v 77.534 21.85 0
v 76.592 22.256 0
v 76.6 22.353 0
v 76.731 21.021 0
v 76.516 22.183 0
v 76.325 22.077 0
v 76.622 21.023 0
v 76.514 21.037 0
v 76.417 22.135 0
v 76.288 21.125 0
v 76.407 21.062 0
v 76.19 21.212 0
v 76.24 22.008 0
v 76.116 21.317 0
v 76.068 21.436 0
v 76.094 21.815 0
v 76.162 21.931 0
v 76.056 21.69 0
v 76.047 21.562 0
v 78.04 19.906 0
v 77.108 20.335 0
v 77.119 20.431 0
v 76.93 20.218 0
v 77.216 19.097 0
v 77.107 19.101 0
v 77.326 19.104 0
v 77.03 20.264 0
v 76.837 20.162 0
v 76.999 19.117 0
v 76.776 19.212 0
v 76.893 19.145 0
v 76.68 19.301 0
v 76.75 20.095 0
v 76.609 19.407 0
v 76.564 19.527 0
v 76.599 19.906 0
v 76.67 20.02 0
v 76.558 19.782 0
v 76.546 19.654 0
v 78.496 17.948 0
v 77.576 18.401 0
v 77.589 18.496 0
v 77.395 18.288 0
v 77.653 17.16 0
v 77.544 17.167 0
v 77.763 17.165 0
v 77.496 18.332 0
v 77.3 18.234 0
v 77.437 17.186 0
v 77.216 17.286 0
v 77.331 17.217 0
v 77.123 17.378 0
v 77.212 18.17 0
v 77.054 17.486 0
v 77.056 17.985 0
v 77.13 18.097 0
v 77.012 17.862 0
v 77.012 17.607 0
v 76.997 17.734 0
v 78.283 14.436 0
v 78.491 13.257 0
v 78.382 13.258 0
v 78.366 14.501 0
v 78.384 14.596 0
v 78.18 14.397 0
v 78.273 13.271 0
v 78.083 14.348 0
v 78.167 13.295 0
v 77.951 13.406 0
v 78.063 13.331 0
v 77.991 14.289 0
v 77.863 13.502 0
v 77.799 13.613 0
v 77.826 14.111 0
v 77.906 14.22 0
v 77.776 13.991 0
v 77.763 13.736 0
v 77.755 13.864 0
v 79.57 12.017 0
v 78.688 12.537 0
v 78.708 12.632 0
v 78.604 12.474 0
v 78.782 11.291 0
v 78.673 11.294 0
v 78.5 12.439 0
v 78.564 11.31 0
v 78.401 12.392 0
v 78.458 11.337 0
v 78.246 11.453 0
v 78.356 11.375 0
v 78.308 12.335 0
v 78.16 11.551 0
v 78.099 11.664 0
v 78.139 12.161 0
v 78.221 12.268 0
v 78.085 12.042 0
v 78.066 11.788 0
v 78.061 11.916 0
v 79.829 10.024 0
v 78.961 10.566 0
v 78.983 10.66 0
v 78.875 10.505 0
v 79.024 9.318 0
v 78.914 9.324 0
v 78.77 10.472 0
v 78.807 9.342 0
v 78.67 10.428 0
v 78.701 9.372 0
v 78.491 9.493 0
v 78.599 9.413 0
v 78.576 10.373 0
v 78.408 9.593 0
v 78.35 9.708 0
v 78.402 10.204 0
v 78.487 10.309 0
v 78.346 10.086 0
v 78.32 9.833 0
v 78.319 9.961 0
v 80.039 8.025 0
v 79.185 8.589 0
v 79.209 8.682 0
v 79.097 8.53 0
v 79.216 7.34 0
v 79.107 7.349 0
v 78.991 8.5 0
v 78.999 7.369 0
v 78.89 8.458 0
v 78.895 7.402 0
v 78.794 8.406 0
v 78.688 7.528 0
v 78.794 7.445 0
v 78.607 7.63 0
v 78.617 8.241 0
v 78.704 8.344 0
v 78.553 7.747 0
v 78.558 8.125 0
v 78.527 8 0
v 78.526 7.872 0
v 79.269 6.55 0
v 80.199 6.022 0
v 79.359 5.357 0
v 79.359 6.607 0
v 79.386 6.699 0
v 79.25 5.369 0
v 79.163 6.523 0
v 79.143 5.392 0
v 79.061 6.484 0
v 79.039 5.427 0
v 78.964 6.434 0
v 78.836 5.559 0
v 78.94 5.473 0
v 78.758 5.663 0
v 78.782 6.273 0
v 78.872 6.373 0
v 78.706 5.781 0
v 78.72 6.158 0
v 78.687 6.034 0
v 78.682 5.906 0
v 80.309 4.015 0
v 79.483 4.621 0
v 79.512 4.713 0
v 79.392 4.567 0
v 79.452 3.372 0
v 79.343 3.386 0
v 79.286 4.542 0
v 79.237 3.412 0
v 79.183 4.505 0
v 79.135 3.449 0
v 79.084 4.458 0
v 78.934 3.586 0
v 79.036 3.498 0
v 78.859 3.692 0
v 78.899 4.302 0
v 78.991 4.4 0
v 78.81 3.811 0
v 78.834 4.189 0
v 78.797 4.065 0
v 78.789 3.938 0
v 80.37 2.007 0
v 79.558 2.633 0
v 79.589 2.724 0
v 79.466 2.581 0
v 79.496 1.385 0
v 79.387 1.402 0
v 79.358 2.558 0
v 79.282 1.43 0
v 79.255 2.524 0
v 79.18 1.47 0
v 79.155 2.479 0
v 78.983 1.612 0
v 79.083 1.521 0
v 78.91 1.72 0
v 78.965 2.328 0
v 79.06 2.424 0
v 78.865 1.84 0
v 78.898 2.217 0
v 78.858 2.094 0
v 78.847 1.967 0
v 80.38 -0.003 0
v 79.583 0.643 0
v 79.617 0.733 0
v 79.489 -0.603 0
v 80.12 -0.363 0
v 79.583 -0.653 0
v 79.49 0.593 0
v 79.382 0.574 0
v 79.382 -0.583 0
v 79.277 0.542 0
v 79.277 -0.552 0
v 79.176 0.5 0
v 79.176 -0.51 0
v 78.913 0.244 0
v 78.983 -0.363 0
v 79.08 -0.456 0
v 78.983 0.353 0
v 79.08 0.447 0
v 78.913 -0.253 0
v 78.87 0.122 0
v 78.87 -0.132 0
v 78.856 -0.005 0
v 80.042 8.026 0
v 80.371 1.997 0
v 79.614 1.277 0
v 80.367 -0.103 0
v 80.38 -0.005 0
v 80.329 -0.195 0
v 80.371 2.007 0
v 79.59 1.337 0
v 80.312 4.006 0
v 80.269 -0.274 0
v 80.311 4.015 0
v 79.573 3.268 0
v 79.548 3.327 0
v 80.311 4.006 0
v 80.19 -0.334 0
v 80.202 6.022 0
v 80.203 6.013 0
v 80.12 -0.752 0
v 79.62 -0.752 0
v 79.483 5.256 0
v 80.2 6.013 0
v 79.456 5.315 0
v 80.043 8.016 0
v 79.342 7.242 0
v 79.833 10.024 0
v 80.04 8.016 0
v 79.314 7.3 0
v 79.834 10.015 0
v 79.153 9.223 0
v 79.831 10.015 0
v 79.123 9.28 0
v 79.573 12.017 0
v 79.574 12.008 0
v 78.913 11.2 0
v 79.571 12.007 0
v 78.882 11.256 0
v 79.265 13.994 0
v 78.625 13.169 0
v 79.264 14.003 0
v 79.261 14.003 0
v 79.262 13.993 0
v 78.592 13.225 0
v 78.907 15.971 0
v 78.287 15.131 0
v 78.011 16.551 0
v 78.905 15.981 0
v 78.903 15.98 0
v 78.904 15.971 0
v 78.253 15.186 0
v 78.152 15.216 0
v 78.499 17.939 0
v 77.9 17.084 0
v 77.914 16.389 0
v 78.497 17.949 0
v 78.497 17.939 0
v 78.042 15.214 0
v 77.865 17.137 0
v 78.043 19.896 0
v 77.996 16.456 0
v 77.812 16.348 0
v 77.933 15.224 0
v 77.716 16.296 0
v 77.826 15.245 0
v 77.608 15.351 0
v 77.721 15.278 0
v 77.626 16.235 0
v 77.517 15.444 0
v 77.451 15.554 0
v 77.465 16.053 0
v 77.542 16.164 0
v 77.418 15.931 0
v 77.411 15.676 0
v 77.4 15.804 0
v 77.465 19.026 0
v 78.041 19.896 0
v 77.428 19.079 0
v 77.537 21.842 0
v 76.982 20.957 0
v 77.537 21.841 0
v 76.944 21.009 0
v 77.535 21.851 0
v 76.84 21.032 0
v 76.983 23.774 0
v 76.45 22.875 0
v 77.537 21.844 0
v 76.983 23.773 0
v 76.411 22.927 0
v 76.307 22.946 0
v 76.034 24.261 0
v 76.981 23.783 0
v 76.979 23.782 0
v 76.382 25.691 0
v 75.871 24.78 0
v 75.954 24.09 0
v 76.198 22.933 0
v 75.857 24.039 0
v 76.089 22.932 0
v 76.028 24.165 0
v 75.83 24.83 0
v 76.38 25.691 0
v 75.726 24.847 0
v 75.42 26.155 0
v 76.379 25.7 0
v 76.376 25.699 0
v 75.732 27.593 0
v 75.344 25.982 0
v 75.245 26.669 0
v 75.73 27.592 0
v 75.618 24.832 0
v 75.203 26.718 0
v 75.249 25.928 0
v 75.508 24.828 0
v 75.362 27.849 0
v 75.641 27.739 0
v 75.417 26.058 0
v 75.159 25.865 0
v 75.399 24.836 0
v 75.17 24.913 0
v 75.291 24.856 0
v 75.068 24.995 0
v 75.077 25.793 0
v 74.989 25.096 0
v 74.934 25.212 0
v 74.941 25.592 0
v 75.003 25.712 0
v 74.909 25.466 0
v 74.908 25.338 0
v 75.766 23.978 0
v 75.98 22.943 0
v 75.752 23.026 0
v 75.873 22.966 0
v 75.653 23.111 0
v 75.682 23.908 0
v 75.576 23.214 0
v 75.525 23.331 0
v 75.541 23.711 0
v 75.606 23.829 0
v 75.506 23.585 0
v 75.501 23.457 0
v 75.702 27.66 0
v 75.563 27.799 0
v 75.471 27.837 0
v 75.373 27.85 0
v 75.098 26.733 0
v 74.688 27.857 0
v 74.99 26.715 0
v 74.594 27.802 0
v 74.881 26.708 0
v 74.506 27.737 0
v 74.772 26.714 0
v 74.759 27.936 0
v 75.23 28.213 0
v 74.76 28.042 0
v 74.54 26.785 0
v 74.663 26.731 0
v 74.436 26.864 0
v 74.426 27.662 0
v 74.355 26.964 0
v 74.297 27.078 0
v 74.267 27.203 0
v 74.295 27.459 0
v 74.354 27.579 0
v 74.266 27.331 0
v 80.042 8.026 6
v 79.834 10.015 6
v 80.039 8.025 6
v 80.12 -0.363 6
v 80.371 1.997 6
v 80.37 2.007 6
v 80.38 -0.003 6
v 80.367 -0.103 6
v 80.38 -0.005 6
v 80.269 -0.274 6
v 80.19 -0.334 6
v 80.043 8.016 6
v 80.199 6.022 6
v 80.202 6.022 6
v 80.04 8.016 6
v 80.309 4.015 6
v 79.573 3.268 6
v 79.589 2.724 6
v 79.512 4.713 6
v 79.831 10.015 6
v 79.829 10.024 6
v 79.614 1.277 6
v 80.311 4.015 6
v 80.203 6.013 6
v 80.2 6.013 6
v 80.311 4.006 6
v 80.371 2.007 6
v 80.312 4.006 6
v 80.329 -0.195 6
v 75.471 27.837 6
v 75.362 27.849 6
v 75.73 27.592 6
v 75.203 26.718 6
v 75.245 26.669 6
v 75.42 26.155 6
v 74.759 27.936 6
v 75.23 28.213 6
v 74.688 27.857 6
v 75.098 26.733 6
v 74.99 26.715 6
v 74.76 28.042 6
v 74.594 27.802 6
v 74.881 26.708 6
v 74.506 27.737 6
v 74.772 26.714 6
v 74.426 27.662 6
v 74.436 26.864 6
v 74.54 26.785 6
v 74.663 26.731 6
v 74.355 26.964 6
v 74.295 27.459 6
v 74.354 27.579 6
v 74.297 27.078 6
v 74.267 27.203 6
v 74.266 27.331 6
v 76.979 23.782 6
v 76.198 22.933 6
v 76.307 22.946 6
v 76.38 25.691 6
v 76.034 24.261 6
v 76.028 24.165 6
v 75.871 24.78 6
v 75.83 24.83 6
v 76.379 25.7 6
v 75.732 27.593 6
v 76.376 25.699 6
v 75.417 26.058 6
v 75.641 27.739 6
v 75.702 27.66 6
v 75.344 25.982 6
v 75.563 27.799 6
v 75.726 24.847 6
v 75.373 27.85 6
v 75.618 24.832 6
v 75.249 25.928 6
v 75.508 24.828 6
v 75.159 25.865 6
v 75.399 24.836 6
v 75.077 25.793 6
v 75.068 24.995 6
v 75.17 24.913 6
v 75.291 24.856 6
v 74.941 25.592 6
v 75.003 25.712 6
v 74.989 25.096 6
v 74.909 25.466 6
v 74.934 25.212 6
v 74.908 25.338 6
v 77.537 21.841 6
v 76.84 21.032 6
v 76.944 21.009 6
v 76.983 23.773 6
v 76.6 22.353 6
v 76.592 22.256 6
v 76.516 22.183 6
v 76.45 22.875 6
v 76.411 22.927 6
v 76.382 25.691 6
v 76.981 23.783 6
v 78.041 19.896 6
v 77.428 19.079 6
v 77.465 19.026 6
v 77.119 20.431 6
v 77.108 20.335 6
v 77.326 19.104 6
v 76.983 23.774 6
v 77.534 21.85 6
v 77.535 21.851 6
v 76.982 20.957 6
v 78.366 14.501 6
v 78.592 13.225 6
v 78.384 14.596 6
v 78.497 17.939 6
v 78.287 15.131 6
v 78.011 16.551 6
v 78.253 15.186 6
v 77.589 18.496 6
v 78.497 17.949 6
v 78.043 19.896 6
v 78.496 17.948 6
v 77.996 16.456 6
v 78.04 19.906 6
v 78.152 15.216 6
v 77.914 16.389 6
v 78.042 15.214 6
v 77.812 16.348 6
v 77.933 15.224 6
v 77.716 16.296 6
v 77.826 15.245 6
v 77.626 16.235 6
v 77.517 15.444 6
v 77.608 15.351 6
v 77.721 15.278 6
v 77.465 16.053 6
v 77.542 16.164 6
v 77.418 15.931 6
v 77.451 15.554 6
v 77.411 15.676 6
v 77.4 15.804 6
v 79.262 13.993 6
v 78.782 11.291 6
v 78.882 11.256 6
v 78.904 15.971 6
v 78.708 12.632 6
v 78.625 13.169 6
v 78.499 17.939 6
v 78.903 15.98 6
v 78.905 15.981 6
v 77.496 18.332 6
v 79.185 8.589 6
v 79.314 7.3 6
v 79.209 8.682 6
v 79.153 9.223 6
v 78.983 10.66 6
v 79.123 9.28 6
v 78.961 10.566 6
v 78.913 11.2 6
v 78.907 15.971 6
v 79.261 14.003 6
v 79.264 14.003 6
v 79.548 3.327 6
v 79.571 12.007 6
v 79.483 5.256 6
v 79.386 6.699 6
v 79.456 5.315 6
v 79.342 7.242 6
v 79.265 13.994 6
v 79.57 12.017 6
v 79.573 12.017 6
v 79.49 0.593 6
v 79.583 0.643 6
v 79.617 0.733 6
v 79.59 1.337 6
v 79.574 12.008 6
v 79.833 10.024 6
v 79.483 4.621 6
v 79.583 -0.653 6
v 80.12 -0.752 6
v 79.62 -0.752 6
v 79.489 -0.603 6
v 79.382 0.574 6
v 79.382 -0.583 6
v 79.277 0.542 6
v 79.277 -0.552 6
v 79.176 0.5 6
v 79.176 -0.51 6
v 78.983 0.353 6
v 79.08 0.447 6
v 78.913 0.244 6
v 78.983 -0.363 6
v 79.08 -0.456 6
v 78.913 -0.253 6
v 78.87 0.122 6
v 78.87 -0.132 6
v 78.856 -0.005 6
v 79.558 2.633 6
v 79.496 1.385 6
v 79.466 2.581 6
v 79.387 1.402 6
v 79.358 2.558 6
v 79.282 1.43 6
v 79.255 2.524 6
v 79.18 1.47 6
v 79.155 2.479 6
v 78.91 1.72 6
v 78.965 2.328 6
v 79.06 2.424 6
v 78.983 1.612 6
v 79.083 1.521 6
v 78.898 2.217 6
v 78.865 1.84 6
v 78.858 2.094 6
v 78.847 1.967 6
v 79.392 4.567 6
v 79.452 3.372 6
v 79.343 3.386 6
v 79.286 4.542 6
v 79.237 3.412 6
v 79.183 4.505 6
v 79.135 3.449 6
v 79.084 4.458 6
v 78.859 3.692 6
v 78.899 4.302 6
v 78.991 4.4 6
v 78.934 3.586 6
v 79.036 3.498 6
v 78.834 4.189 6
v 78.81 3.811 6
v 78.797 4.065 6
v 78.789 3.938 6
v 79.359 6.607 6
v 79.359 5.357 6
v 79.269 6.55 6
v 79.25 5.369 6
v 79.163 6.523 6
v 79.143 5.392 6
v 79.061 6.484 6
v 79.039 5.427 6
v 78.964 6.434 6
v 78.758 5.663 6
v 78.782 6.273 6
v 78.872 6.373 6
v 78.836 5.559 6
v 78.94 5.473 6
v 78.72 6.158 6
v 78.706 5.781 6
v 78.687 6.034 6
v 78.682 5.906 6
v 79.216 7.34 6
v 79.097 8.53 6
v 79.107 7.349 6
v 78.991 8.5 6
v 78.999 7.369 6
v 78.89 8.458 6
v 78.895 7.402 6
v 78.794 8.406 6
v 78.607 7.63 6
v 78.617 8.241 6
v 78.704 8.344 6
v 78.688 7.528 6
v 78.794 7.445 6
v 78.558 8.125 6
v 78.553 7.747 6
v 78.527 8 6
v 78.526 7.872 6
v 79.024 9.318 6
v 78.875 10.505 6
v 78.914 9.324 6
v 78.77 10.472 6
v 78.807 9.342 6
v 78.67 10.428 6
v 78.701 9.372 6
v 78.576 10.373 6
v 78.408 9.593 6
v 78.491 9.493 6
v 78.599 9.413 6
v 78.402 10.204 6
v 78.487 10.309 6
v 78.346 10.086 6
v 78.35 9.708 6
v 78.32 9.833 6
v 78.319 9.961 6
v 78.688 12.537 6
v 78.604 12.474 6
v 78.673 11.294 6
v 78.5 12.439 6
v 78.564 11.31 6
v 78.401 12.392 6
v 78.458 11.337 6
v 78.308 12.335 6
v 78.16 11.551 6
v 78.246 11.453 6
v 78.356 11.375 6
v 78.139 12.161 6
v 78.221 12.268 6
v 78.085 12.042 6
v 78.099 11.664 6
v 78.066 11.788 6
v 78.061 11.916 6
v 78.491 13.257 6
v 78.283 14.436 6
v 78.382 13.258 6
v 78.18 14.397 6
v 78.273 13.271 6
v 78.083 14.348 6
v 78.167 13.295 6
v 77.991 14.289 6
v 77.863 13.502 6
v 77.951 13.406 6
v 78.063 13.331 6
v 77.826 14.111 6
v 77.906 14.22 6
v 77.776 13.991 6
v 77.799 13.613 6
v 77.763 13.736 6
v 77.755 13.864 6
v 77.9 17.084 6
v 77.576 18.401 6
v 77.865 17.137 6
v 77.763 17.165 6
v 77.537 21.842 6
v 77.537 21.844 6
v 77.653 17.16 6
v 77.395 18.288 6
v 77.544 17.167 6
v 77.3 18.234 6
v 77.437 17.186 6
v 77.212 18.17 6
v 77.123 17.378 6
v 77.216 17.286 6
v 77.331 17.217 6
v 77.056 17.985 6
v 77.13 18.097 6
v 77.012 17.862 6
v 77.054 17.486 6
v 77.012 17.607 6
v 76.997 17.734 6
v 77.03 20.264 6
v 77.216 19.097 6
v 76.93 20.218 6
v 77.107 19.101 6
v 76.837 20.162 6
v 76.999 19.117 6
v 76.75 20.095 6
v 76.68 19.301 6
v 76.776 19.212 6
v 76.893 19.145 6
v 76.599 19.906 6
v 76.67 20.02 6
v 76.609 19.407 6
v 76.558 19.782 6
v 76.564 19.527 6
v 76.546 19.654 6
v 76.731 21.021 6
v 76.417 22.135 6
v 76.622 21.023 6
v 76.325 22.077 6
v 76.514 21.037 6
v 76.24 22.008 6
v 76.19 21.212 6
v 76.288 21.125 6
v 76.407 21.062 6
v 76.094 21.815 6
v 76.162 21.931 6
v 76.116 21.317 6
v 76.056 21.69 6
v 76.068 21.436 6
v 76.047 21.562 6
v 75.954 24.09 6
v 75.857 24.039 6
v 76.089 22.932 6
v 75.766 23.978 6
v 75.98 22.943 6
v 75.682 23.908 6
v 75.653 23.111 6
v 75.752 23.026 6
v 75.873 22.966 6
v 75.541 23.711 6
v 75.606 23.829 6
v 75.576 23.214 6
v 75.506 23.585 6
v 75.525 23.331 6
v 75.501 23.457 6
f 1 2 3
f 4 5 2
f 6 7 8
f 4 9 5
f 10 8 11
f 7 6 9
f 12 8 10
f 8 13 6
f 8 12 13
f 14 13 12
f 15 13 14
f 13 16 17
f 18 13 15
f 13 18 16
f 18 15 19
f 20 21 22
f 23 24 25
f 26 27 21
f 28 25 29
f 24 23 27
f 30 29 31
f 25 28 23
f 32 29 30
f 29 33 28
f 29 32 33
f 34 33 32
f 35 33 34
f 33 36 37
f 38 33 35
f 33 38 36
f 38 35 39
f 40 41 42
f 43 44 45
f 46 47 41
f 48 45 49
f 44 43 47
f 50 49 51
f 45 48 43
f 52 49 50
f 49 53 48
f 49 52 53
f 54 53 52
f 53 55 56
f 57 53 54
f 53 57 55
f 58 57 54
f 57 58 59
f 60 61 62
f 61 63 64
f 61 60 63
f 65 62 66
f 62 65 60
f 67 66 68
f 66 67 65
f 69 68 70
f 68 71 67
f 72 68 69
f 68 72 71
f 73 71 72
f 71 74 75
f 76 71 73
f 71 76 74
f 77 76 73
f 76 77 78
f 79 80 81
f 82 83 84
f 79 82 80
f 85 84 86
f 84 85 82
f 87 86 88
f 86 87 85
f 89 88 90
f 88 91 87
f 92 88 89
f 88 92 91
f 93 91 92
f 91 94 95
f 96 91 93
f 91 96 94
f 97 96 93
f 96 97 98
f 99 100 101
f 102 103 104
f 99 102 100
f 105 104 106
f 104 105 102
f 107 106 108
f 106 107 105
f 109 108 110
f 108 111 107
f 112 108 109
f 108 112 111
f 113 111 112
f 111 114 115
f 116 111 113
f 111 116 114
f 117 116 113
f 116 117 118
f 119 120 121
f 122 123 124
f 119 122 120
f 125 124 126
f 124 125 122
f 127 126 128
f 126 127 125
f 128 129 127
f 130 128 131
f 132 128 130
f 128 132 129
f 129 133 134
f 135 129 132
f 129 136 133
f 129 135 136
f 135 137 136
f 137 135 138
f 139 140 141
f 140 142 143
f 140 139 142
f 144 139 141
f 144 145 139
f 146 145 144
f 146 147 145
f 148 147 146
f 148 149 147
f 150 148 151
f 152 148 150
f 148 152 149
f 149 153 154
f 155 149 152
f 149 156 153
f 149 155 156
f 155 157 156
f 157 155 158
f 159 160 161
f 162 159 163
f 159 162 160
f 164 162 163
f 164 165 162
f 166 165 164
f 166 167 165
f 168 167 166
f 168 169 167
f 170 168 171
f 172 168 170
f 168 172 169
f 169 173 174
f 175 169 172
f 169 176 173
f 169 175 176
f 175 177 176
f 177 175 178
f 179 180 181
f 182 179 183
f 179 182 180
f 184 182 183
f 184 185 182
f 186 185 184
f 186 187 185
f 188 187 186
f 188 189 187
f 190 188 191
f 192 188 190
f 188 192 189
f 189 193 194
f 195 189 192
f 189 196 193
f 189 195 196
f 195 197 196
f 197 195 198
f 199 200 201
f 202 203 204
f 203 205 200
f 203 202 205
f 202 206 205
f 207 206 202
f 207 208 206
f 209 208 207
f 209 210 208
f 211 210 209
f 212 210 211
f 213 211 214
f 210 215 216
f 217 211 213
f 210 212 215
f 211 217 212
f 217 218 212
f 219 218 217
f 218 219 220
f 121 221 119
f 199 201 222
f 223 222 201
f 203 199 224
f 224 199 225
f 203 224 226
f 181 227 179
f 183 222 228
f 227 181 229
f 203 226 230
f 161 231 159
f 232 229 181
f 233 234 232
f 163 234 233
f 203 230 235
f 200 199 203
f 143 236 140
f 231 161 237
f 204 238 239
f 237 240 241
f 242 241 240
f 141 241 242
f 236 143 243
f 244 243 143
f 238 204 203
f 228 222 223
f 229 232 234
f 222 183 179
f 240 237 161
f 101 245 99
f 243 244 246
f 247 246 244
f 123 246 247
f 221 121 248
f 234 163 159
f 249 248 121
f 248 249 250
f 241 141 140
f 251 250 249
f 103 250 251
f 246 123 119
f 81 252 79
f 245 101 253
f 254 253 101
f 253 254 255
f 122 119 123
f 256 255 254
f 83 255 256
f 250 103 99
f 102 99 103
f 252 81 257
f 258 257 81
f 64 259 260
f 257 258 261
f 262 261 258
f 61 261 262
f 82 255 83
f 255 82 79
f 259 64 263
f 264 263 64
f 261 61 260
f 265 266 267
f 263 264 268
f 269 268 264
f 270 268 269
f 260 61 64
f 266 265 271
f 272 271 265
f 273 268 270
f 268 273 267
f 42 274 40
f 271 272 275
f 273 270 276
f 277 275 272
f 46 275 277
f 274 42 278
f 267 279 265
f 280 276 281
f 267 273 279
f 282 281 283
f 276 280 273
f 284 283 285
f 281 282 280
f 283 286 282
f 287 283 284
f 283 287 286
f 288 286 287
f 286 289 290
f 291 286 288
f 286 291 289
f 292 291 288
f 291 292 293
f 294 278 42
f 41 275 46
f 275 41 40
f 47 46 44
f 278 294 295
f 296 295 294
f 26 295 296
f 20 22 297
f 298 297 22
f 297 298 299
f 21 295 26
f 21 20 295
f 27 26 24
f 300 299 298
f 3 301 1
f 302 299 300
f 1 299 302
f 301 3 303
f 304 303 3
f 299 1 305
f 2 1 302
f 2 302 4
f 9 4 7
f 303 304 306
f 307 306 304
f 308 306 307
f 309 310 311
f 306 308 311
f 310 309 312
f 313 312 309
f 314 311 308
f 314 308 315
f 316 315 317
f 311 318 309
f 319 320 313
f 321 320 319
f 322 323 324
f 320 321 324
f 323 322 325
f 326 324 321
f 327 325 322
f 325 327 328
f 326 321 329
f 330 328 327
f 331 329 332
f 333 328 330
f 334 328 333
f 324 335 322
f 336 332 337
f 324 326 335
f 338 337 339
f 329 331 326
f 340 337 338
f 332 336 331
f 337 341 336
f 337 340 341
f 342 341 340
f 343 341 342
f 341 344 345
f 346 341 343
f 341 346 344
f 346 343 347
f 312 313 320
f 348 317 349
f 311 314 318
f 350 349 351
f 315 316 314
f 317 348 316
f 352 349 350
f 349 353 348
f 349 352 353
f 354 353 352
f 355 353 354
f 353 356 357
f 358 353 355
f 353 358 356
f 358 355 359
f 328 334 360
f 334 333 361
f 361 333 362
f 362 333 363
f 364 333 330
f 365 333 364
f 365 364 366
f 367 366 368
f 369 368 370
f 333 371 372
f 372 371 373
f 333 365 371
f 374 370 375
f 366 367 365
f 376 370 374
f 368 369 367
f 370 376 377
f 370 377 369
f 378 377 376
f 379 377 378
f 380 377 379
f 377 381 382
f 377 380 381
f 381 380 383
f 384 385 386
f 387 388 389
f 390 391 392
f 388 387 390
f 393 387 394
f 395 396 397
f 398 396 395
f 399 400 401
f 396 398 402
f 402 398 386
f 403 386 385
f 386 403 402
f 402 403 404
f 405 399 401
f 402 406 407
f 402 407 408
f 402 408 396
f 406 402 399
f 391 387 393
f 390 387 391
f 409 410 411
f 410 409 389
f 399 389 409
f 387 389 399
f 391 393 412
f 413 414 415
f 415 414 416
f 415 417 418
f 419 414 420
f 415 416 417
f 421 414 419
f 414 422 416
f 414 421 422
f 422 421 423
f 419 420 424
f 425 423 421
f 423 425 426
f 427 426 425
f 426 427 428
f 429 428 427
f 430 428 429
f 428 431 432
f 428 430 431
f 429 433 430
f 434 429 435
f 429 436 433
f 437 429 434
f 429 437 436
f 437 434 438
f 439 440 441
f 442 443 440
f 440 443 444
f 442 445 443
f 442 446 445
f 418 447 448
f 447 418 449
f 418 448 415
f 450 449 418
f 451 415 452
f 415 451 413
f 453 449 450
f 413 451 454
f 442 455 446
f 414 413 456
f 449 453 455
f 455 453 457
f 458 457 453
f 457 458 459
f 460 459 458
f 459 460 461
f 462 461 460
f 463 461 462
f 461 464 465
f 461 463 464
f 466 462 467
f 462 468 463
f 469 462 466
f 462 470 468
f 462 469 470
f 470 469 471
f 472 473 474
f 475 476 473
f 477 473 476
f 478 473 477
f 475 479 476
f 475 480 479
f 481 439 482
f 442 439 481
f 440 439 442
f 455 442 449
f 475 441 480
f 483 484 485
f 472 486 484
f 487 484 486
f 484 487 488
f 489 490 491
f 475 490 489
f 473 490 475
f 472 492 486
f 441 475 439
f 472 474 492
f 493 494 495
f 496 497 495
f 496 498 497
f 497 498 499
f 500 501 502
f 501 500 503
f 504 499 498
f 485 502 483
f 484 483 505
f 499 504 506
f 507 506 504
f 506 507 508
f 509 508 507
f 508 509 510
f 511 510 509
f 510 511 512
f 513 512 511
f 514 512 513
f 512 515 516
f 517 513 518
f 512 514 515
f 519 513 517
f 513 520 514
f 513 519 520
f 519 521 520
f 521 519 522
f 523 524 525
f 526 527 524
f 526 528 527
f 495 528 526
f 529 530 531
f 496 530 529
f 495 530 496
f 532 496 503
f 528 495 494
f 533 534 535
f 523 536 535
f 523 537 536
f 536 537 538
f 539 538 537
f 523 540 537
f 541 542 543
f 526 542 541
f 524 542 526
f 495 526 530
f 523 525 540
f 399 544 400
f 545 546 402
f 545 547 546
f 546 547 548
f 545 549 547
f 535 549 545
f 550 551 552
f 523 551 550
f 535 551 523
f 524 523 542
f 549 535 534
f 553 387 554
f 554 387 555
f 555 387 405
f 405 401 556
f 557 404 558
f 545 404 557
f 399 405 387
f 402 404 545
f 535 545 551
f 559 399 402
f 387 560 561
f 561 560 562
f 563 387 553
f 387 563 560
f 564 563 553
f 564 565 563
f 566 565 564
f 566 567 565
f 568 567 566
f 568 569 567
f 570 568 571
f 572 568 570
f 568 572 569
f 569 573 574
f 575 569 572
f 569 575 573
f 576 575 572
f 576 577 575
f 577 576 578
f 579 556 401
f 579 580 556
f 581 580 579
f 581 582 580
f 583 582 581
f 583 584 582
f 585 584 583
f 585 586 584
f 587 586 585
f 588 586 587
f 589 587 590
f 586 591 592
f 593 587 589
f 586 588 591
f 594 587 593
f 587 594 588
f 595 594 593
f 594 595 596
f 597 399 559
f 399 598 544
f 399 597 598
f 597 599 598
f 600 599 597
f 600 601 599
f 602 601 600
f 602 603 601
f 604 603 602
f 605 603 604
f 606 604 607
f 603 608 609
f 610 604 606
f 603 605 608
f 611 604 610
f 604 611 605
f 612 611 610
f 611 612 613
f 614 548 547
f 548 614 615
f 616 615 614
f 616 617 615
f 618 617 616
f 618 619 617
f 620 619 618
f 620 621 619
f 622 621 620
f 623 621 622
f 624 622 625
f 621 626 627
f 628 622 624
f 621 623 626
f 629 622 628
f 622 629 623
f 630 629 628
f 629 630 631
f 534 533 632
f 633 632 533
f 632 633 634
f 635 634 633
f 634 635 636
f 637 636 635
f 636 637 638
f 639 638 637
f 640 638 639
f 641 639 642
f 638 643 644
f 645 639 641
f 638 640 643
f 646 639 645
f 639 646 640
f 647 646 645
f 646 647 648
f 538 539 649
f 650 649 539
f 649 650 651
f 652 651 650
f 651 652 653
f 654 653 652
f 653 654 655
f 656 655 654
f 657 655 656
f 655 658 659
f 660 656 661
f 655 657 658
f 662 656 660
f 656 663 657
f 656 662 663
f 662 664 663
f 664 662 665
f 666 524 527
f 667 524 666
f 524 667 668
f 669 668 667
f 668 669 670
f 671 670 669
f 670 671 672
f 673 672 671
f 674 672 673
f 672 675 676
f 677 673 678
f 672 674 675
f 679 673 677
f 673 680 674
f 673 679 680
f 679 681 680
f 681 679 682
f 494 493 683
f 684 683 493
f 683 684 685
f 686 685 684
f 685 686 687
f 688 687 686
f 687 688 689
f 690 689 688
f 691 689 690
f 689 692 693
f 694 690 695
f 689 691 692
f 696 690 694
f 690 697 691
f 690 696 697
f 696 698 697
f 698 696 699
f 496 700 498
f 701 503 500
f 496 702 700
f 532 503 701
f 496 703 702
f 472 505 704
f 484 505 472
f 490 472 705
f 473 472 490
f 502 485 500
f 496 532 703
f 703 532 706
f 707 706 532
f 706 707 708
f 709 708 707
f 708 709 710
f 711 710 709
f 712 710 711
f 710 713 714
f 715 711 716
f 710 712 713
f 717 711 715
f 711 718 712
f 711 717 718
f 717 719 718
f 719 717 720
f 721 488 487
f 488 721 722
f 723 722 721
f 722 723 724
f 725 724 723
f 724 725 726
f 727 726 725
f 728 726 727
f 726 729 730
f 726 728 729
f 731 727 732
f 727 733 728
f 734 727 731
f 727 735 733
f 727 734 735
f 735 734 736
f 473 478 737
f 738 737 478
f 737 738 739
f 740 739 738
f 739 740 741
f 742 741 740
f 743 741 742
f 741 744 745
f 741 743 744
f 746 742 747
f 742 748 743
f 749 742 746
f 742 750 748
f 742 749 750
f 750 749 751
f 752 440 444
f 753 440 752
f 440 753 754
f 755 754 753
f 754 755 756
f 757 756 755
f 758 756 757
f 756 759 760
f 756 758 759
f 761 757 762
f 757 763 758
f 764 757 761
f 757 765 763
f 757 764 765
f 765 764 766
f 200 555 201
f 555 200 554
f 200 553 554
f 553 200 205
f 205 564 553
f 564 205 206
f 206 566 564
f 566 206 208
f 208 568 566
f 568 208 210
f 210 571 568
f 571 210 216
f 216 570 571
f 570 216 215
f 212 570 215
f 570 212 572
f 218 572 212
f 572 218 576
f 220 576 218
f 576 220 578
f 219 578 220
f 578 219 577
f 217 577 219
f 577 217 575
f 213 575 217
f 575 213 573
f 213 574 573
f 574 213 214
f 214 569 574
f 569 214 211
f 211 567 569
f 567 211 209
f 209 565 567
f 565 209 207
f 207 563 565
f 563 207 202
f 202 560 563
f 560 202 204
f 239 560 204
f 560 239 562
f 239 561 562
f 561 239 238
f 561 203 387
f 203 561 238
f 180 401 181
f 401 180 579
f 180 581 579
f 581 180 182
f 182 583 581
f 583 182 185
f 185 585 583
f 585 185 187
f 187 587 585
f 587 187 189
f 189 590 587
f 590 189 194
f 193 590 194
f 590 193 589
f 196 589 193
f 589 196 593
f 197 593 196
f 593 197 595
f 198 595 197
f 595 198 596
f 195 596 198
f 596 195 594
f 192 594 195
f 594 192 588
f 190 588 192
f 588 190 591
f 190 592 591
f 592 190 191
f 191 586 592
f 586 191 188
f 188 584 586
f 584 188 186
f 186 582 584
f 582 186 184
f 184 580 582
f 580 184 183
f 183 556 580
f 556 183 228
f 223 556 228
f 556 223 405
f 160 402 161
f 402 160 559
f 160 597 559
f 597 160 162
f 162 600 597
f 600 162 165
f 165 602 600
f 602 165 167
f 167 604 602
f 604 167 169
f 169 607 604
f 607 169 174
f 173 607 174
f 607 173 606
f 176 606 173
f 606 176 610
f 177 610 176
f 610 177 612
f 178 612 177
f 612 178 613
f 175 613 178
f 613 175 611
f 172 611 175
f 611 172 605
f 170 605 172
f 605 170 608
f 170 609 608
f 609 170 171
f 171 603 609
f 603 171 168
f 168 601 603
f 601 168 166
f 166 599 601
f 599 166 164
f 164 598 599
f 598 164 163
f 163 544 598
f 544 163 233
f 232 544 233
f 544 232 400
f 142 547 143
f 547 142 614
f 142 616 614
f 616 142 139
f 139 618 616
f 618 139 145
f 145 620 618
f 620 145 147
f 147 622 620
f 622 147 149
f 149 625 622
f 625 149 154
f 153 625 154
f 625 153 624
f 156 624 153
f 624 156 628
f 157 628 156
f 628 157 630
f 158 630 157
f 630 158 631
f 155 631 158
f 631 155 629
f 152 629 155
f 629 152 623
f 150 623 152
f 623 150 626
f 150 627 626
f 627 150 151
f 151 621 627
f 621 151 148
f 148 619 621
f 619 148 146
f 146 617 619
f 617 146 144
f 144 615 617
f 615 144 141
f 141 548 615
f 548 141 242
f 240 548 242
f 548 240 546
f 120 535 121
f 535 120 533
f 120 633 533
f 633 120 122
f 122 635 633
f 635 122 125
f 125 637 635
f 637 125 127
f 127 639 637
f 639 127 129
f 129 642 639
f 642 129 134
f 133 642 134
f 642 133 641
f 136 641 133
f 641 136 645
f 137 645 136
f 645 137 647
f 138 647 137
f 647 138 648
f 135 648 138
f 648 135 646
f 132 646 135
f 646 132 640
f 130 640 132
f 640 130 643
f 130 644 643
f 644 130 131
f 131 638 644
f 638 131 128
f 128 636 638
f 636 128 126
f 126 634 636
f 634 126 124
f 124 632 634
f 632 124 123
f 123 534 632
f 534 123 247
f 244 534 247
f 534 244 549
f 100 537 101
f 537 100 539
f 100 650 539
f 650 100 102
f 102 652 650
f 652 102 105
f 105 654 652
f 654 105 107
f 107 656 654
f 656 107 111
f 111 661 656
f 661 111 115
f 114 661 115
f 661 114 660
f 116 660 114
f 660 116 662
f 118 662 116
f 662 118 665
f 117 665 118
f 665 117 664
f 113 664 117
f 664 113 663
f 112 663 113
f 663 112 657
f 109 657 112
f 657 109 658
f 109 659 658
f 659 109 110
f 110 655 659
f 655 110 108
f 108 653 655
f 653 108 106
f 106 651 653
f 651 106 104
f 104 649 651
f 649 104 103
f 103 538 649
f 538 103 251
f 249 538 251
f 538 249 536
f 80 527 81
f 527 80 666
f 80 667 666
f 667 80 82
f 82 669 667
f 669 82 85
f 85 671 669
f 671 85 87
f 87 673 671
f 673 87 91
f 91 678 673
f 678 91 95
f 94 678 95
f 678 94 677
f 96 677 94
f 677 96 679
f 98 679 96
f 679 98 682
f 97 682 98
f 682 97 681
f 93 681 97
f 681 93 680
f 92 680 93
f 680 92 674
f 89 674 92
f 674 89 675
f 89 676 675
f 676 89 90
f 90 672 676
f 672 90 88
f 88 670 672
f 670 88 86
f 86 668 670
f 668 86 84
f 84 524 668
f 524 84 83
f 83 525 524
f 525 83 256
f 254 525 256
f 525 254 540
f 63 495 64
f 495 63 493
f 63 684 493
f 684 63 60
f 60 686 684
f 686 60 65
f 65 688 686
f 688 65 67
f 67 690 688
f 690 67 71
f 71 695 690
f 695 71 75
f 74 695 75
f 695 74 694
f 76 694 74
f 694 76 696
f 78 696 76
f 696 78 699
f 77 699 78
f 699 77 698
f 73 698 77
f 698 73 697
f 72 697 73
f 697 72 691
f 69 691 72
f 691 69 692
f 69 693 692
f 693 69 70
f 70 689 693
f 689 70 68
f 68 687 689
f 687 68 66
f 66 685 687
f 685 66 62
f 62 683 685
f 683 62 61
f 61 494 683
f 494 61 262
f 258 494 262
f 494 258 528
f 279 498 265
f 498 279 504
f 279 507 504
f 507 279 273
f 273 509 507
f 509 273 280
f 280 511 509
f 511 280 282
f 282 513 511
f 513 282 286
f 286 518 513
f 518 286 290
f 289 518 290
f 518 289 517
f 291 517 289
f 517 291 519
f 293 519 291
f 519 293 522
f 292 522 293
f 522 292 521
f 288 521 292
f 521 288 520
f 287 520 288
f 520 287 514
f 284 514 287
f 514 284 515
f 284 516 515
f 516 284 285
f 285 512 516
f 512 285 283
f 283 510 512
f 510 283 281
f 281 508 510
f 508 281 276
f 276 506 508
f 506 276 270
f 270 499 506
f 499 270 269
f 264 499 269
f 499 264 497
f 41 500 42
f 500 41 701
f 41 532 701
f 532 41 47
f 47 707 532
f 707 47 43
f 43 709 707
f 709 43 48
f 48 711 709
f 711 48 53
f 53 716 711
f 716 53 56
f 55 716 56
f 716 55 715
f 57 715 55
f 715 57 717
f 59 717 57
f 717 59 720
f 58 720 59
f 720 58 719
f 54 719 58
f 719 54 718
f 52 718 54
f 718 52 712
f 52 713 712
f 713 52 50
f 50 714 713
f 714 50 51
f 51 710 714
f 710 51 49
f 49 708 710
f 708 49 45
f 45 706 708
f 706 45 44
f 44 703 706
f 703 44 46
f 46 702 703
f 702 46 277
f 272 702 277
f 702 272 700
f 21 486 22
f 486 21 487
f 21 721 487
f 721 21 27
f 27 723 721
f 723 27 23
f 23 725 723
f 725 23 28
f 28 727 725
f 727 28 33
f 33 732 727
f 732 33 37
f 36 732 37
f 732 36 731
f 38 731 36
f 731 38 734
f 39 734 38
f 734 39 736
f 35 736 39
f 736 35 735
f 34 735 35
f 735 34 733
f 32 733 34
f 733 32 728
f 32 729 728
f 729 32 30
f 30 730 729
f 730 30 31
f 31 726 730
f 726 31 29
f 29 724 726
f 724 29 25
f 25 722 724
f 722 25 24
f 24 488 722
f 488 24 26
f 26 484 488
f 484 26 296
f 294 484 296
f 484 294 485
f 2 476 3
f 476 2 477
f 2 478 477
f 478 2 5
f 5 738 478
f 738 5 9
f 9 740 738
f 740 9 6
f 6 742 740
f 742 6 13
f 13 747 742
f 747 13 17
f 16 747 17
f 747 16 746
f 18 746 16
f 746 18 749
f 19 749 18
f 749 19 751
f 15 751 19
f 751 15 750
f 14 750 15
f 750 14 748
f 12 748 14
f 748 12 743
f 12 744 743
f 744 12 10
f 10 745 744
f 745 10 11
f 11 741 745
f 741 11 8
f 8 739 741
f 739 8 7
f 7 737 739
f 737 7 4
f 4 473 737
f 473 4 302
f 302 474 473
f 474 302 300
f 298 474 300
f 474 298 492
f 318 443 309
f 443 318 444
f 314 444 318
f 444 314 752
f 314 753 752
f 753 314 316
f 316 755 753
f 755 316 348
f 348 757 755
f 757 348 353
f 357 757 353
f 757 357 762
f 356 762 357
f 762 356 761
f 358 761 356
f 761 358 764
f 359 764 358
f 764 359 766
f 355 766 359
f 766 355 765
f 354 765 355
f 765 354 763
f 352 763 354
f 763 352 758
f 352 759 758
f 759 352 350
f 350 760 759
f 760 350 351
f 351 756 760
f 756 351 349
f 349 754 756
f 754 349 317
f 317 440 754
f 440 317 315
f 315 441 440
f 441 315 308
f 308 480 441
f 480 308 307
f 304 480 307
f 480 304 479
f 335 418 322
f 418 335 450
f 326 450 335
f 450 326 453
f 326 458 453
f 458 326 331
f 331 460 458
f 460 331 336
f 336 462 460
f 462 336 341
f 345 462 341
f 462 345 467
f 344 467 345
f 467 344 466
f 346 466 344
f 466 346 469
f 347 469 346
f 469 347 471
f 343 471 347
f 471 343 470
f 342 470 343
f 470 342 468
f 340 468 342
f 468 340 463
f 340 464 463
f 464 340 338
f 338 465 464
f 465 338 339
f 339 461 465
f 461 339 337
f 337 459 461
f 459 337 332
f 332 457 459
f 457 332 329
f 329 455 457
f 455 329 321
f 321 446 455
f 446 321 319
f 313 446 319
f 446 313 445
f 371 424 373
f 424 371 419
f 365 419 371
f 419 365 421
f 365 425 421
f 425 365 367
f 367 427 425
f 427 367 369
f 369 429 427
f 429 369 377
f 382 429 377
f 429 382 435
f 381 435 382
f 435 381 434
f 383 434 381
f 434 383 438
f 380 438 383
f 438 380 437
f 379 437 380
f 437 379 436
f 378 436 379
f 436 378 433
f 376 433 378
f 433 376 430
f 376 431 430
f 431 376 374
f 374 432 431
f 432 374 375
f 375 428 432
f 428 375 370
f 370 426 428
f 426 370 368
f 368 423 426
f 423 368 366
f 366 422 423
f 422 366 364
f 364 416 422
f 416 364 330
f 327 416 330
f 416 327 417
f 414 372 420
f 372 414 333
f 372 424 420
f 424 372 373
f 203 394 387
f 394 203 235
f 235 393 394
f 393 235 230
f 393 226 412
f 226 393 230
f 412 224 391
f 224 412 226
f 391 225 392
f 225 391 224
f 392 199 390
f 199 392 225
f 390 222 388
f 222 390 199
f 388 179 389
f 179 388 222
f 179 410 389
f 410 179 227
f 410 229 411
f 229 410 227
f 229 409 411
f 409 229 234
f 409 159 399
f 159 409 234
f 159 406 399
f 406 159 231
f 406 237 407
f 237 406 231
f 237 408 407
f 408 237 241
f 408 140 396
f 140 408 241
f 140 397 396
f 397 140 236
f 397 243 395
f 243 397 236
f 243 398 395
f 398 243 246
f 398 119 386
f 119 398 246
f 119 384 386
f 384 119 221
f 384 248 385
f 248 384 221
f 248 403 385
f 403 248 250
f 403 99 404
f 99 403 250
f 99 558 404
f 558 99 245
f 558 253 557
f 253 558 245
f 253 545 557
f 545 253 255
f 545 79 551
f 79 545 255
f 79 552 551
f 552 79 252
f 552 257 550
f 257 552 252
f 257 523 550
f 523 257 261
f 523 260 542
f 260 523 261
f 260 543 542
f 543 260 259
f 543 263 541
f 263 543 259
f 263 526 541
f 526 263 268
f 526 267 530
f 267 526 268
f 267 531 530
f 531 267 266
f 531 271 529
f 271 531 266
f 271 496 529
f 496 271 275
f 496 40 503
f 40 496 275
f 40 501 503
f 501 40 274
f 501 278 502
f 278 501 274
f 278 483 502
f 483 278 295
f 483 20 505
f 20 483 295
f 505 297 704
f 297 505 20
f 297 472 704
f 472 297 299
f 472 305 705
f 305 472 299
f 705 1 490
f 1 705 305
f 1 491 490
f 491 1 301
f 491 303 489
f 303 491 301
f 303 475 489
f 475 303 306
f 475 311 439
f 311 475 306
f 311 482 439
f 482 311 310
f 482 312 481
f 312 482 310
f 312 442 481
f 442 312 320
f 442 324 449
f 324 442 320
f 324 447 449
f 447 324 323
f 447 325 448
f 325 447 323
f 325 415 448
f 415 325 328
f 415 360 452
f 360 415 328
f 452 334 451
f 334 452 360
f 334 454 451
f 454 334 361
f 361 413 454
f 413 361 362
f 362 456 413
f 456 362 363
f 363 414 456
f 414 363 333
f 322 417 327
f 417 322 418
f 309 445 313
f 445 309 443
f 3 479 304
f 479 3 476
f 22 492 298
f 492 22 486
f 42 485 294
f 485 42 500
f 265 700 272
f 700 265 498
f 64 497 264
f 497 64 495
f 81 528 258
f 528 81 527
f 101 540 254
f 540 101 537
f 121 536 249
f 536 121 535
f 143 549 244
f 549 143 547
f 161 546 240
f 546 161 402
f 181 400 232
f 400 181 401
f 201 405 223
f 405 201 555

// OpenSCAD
/*[Belt]*/
teeth_type = "GT2 2mm";    // [GT2 2mm, GT2 3mm, GT2 5mm, 40DP, MXL, XL, L, T 2.5mm, T 5mm, T 10mm, T 10mm extended, AT 5mm, HTD 3mm, HTD 5mm, HTD 8mm]
teeth_pitch = 2;            // Distance between teeth
belt_width = 6;
belt_thickness = 0.76;
belt_lenght = 30;

/*[Extra Configuration]*/
spiral_spacing = 4;         // Distance between spirals
spiral_inner_radius = 80;  // Radius of the inner loop

// preview[view:south west, tilt:top diagonal]

/* Some standard values *\
teeth_type - teeth_pitch - belt_thickness - belt_width
GT2 2mm   - 2           - 0.76           - 6
GT2 3mm   - 3           - 1.27           - 9
GT2 5mm   - 5           - 1.88           - 15
40DP        - 2.073       - 0.74           - 4.7625
MXL         - 2.032       - 0.74           - 6.35
XL           - 5.08        - 1.03           - 7.94
L            - 9.525       - 1.66           - 19.05
T 2.5mm    - 2.5         - 0.6            - 6
T 5mm      - 5           - 1              - 10
T 10mm     - 10          - 2              - 16
AT 5mm     - 5           - 1              - 10
HTD 3mm   - 3           - 1.19           - 9
HTD 5mm   - 5           - 1.73           - 9
HTD 8mm   - 8           - 2.64           - 30
*/

init_radian = 3.14159 * (spiral_inner_radius/2);  // initial angle
b = spiral_spacing / 2 / 3.14159;
number_of_teeth = ceil(belt_lenght/teeth_pitch);

function r(b, theta) = b * theta;

function radian_step(b, theta, l) = 
    acos((2 * pow(r(b, theta), 2) - pow(l, 2)) / (2 * pow(r(b, theta), 2))) / 180 * 3.14159;

function find_radians(b, l, radians, n, count = 1) =
    count == n ? radians : (
        find_radians(
            b, 
            l, 
            concat(
                radians, // current angle
                [radians[count - 1] + radian_step(b, radians[count - 1], l)] // angle after rotating
            ), 
            n,
        count + 1)
    );

module line(point1, point2, width = 1, cap_round = true) {
    angle = 90 - atan((point2[1] - point1[1]) / (point2[0] - point1[0]));
    offset_x = 1 * width * cos(angle);
    offset_y = 1 * width * sin(angle);
    offset1 = [-offset_x, offset_y];
    offset2 = [offset_x, -offset_y];

    if(cap_round) {
        translate(point1) circle(d = width*2, $fn = 24);
        translate(point2) circle(d = width*2, $fn = 24);
    }

    polygon(points=[
        point1 + offset1, point2 + offset1,  
        point2 + offset2, point1 + offset2
    ]);
}

module polyline(points, width = 1) {
    module polyline_inner(points, index) {
        if(index < len(points)) {
            line(points[index - 1], points[index], width);
            polyline_inner(points, index + 1);
        }
    }
    polyline_inner(points, 1);
}

module teeth(type = "GT2 2mm") {
    if( type == "GT2 2mm" ) GT2_2mm();
	else if( type == "GT2 3mm" ) GT2_3mm();
	else if( type == "GT2 5mm" ) GT2_5mm();
	else if( type == "40DP" ) 40DP();
	else if( type == "MXL" ) MXL();
	else if( type == "XL" ) XL();
	else if( type == "L" ) L();
	else if( type == "T 2.5mm" ) T2_5();
	else if( type == "T 5mm" ) T5();
	else if( type == "T 10mm" ) T10();
	else if( type == "T 10mm extended" ) T10_extended();
	else if( type == "AT 5mm" ) AT5();
	else if( type == "HTD 3mm" ) HTD_3mm();
	else if( type == "HTD 5mm" ) HTD_5mm();
	else if( type == "HTD 8mm" ) HTD_8mm();
}

thetas = [for(theta = find_radians(b, teeth_pitch, [init_radian], number_of_teeth)) theta ];

union() {
  // Belt
  linear_extrude(belt_width)
    polyline([for(theta = thetas) [b * theta * cos(theta * 57.2958), b * theta * sin(theta * 57.2958)]], belt_thickness/2);
  // Teeth
  for(theta = thetas) 
    rotate(theta * 57.2958) 
      translate([b * theta, 0, 0])
        rotate(90)
          translate([0,belt_thickness/2,0])
            linear_extrude(belt_width) teeth(teeth_type);
}


// T10_extended constants
teeth_lenght=1.525411;//don't change!
teeth_extension_bottom=0.447675+4/number_of_teeth;
teeth_extension_top=0.447675;

module T10_extended()
  polygon([[-teeth_lenght-teeth_extension_bottom,-1],[-teeth_lenght-teeth_extension_top,0],[-1.41777,0.015495],[-1.320712,0.059664],[-1.239661,0.129034],[-1.180042,0.220133],[-0.793044,1.050219],[-0.733574,1.141021],[-0.652507,1.210425],[-0.555366,1.254759],[-0.447675,1.270353],[0.447675,1.270353],[0.555366,1.254759],[0.652507,1.210425],[0.733574,1.141021],[0.793044,1.050219],[1.180042,0.220133],[1.239711,0.129034],[1.320844,0.059664],[1.417919,0.015495],[teeth_lenght+teeth_extension_top,0],[teeth_lenght+teeth_extension_bottom,-1]]);

module MXL()
  polygon([[-0.660421,-0.5],[-0.660421,0],[-0.621898,0.006033],[-0.587714,0.023037],[-0.560056,0.049424],[-0.541182,0.083609],[-0.417357,0.424392],[-0.398413,0.458752],[-0.370649,0.48514],[-0.336324,0.502074],[-0.297744,0.508035],[0.297744,0.508035],[0.336268,0.502074],[0.370452,0.48514],[0.39811,0.458752],[0.416983,0.424392],[0.540808,0.083609],[0.559752,0.049424],[0.587516,0.023037],[0.621841,0.006033],[0.660421,0],[0.660421,-0.5]]);

module 40DP()
  polygon([[-0.612775,-0.5],[-0.612775,0],[-0.574719,0.010187],[-0.546453,0.0381],[-0.355953,0.3683],[-0.327604,0.405408],[-0.291086,0.433388],[-0.248548,0.451049],[-0.202142,0.4572],[0.202494,0.4572],[0.248653,0.451049],[0.291042,0.433388],[0.327609,0.405408],[0.356306,0.3683],[0.546806,0.0381],[0.574499,0.010187],[0.612775,0],[0.612775,-0.5]]);

module XL()
  polygon([[-1.525411,-1],[-1.525411,0],[-1.41777,0.015495],[-1.320712,0.059664],[-1.239661,0.129034],[-1.180042,0.220133],[-0.793044,1.050219],[-0.733574,1.141021],[-0.652507,1.210425],[-0.555366,1.254759],[-0.447675,1.270353],[0.447675,1.270353],[0.555366,1.254759],[0.652507,1.210425],[0.733574,1.141021],[0.793044,1.050219],[1.180042,0.220133],[1.239711,0.129034],[1.320844,0.059664],[1.417919,0.015495],[1.525411,0],[1.525411,-1]]);

module L()
  polygon([[-2.6797,-1],[-2.6797,0],[-2.600907,0.006138],[-2.525342,0.024024],[-2.45412,0.052881],[-2.388351,0.091909],[-2.329145,0.140328],[-2.277614,0.197358],[-2.234875,0.262205],[-2.202032,0.334091],[-1.75224,1.57093],[-1.719538,1.642815],[-1.676883,1.707663],[-1.62542,1.764693],[-1.566256,1.813112],[-1.500512,1.85214],[-1.4293,1.880997],[-1.353742,1.898883],[-1.274949,1.905021],[1.275281,1.905021],[1.354056,1.898883],[1.429576,1.880997],[1.500731,1.85214],[1.566411,1.813112],[1.625508,1.764693],[1.676919,1.707663],[1.719531,1.642815],[1.752233,1.57093],[2.20273,0.334091],[2.235433,0.262205],[2.278045,0.197358],[2.329455,0.140328],[2.388553,0.091909],[2.454233,0.052881],[2.525384,0.024024],[2.600904,0.006138],[2.6797,0],[2.6797,-1]]);

module T2_5()
  polygon([[-0.839258,-0.5],[-0.839258,0],[-0.770246,0.021652],[-0.726369,0.079022],[-0.529167,0.620889],[-0.485025,0.67826],[-0.416278,0.699911],[0.416278,0.699911],[0.484849,0.67826],[0.528814,0.620889],[0.726369,0.079022],[0.770114,0.021652],[0.839258,0],[0.839258,-0.5]]);

module T5()
  polygon([[-1.632126,-0.5],[-1.632126,0],[-1.568549,0.004939],[-1.507539,0.019367],[-1.450023,0.042686],[-1.396912,0.074224],[-1.349125,0.113379],[-1.307581,0.159508],[-1.273186,0.211991],[-1.246868,0.270192],[-1.009802,0.920362],[-0.983414,0.978433],[-0.949018,1.030788],[-0.907524,1.076798],[-0.859829,1.115847],[-0.80682,1.147314],[-0.749402,1.170562],[-0.688471,1.184956],[-0.624921,1.189895],[0.624971,1.189895],[0.688622,1.184956],[0.749607,1.170562],[0.807043,1.147314],[0.860055,1.115847],[0.907754,1.076798],[0.949269,1.030788],[0.9837,0.978433],[1.010193,0.920362],[1.246907,0.270192],[1.273295,0.211991],[1.307726,0.159508],[1.349276,0.113379],[1.397039,0.074224],[1.450111,0.042686],[1.507589,0.019367],[1.568563,0.004939],[1.632126,0],[1.632126,-0.5]]);

module T10()
  polygon([[-3.06511,-1],[-3.06511,0],[-2.971998,0.007239],[-2.882718,0.028344],[-2.79859,0.062396],[-2.720931,0.108479],[-2.651061,0.165675],[-2.590298,0.233065],[-2.539962,0.309732],[-2.501371,0.394759],[-1.879071,2.105025],[-1.840363,2.190052],[-1.789939,2.266719],[-1.729114,2.334109],[-1.659202,2.391304],[-1.581518,2.437387],[-1.497376,2.47144],[-1.408092,2.492545],[-1.314979,2.499784],[1.314979,2.499784],[1.408091,2.492545],[1.497371,2.47144],[1.581499,2.437387],[1.659158,2.391304],[1.729028,2.334109],[1.789791,2.266719],[1.840127,2.190052],[1.878718,2.105025],[2.501018,0.394759],[2.539726,0.309732],[2.59015,0.233065],[2.650975,0.165675],[2.720887,0.108479],[2.798571,0.062396],[2.882713,0.028344],[2.971997,0.007239],[3.06511,0],[3.06511,-1]]);

module AT5()
  polygon([[-2.134129,-0.75],[-2.134129,0],[-2.058023,0.005488],[-1.984595,0.021547],[-1.914806,0.047569],[-1.849614,0.082947],[-1.789978,0.127073],[-1.736857,0.179338],[-1.691211,0.239136],[-1.653999,0.305859],[-1.349199,0.959203],[-1.286933,1.054635],[-1.201914,1.127346],[-1.099961,1.173664],[-0.986896,1.18992],[0.986543,1.18992],[1.099614,1.173664],[1.201605,1.127346],[1.286729,1.054635],[1.349199,0.959203],[1.653646,0.305859],[1.690859,0.239136],[1.73651,0.179338],[1.789644,0.127073],[1.849305,0.082947],[1.914539,0.047569],[1.984392,0.021547],[2.057906,0.005488],[2.134129,0],[2.134129,-0.75]]);

module HTD_3mm()
  polygon([[-1.135062,-0.5],[-1.135062,0],[-1.048323,0.015484],[-0.974284,0.058517],[-0.919162,0.123974],[-0.889176,0.206728],[-0.81721,0.579614],[-0.800806,0.653232],[-0.778384,0.72416],[-0.750244,0.792137],[-0.716685,0.856903],[-0.678005,0.918199],[-0.634505,0.975764],[-0.586483,1.029338],[-0.534238,1.078662],[-0.47807,1.123476],[-0.418278,1.16352],[-0.355162,1.198533],[-0.289019,1.228257],[-0.22015,1.25243],[-0.148854,1.270793],[-0.07543,1.283087],[-0.000176,1.28905],[0.075081,1.283145],[0.148515,1.270895],[0.219827,1.252561],[0.288716,1.228406],[0.354879,1.19869],[0.418018,1.163675],[0.477831,1.123623],[0.534017,1.078795],[0.586276,1.029452],[0.634307,0.975857],[0.677809,0.91827],[0.716481,0.856953],[0.750022,0.792167],[0.778133,0.724174],[0.800511,0.653236],[0.816857,0.579614],[0.888471,0.206728],[0.919014,0.123974],[0.974328,0.058517],[1.048362,0.015484],[1.135062,0],[1.135062,-0.5]]);

module HTD_5mm()
  polygon([[-1.89036,-0.75],[-1.89036,0],[-1.741168,0.02669],[-1.61387,0.100806],[-1.518984,0.21342],[-1.467026,0.3556],[-1.427162,0.960967],[-1.398568,1.089602],[-1.359437,1.213531],[-1.310296,1.332296],[-1.251672,1.445441],[-1.184092,1.552509],[-1.108081,1.653042],[-1.024167,1.746585],[-0.932877,1.832681],[-0.834736,1.910872],[-0.730271,1.980701],[-0.62001,2.041713],[-0.504478,2.09345],[-0.384202,2.135455],[-0.259708,2.167271],[-0.131524,2.188443],[-0.000176,2.198511],[0.131296,2.188504],[0.259588,2.167387],[0.384174,2.135616],[0.504527,2.093648],[0.620123,2.04194],[0.730433,1.980949],[0.834934,1.911132],[0.933097,1.832945],[1.024398,1.746846],[1.108311,1.653291],[1.184308,1.552736],[1.251865,1.445639],[1.310455,1.332457],[1.359552,1.213647],[1.39863,1.089664],[1.427162,0.960967],[1.467026,0.3556],[1.518984,0.21342],[1.61387,0.100806],[1.741168,0.02669],[1.89036,0],[1.89036,-0.75]]);

module HTD_8mm()
  polygon([[-3.301471,-1],[-3.301471,0],[-3.16611,0.012093],[-3.038062,0.047068],[-2.919646,0.10297],[-2.813182,0.177844],[-2.720989,0.269734],[-2.645387,0.376684],[-2.588694,0.496739],[-2.553229,0.627944],[-2.460801,1.470025],[-2.411413,1.691917],[-2.343887,1.905691],[-2.259126,2.110563],[-2.158035,2.30575],[-2.041518,2.490467],[-1.910478,2.66393],[-1.76582,2.825356],[-1.608446,2.973961],[-1.439261,3.10896],[-1.259169,3.22957],[-1.069074,3.335006],[-0.869878,3.424485],[-0.662487,3.497224],[-0.447804,3.552437],[-0.226732,3.589341],[-0.000176,3.607153],[0.226511,3.589461],[0.447712,3.552654],[0.66252,3.497516],[0.870027,3.424833],[1.069329,3.33539],[1.259517,3.229973],[1.439687,3.109367],[1.608931,2.974358],[1.766344,2.825731],[1.911018,2.664271],[2.042047,2.490765],[2.158526,2.305998],[2.259547,2.110755],[2.344204,1.905821],[2.411591,1.691983],[2.460801,1.470025],[2.553229,0.627944],[2.588592,0.496739],[2.645238,0.376684],[2.720834,0.269734],[2.81305,0.177844],[2.919553,0.10297],[3.038012,0.047068],[3.166095,0.012093],[3.301471,0],[3.301471,-1]]);

module GT2_2mm()
  polygon([[0.747183,-0.5],[0.747183,0],[0.647876,0.037218],[0.598311,0.130528],[0.578556,0.238423],[0.547158,0.343077],[0.504649,0.443762],[0.451556,0.53975],[0.358229,0.636924],[0.2484,0.707276],[0.127259,0.750044],[0,0.76447],[-0.127259,0.750044],[-0.2484,0.707276],[-0.358229,0.636924],[-0.451556,0.53975],[-0.504797,0.443762],[-0.547291,0.343077],[-0.578605,0.238423],[-0.598311,0.130528],[-0.648009,0.037218],[-0.747183,0],[-0.747183,-0.5]]);

module GT2_3mm()
  polygon([[-1.155171,-0.5],[-1.155171,0],[-1.065317,0.016448],[-0.989057,0.062001],[-0.93297,0.130969],[-0.90364,0.217664],[-0.863705,0.408181],[-0.800056,0.591388],[-0.713587,0.765004],[-0.60519,0.926747],[-0.469751,1.032548],[-0.320719,1.108119],[-0.162625,1.153462],[0,1.168577],[0.162625,1.153462],[0.320719,1.108119],[0.469751,1.032548],[0.60519,0.926747],[0.713587,0.765004],[0.800056,0.591388],[0.863705,0.408181],[0.90364,0.217664],[0.932921,0.130969],[0.988924,0.062001],[1.065168,0.016448],[1.155171,0],[1.155171,-0.5]]);

module GT2_5mm()
  polygon([[-1.975908,-0.75],[-1.975908,0],[-1.797959,0.03212],[-1.646634,0.121224],[-1.534534,0.256431],[-1.474258,0.426861],[-1.446911,0.570808],[-1.411774,0.712722],[-1.368964,0.852287],[-1.318597,0.989189],[-1.260788,1.123115],[-1.195654,1.25375],[-1.12331,1.380781],[-1.043869,1.503892],[-0.935264,1.612278],[-0.817959,1.706414],[-0.693181,1.786237],[-0.562151,1.851687],[-0.426095,1.9027],[-0.286235,1.939214],[-0.143795,1.961168],[0,1.9685],[0.143796,1.961168],[0.286235,1.939214],[0.426095,1.9027],[0.562151,1.851687],[0.693181,1.786237],[0.817959,1.706414],[0.935263,1.612278],[1.043869,1.503892],[1.123207,1.380781],[1.195509,1.25375],[1.26065,1.123115],[1.318507,0.989189],[1.368956,0.852287],[1.411872,0.712722],[1.447132,0.570808],[1.474611,0.426861],[1.534583,0.256431],[1.646678,0.121223],[1.798064,0.03212],[1.975908,0],[1.975908,-0.75]]);
